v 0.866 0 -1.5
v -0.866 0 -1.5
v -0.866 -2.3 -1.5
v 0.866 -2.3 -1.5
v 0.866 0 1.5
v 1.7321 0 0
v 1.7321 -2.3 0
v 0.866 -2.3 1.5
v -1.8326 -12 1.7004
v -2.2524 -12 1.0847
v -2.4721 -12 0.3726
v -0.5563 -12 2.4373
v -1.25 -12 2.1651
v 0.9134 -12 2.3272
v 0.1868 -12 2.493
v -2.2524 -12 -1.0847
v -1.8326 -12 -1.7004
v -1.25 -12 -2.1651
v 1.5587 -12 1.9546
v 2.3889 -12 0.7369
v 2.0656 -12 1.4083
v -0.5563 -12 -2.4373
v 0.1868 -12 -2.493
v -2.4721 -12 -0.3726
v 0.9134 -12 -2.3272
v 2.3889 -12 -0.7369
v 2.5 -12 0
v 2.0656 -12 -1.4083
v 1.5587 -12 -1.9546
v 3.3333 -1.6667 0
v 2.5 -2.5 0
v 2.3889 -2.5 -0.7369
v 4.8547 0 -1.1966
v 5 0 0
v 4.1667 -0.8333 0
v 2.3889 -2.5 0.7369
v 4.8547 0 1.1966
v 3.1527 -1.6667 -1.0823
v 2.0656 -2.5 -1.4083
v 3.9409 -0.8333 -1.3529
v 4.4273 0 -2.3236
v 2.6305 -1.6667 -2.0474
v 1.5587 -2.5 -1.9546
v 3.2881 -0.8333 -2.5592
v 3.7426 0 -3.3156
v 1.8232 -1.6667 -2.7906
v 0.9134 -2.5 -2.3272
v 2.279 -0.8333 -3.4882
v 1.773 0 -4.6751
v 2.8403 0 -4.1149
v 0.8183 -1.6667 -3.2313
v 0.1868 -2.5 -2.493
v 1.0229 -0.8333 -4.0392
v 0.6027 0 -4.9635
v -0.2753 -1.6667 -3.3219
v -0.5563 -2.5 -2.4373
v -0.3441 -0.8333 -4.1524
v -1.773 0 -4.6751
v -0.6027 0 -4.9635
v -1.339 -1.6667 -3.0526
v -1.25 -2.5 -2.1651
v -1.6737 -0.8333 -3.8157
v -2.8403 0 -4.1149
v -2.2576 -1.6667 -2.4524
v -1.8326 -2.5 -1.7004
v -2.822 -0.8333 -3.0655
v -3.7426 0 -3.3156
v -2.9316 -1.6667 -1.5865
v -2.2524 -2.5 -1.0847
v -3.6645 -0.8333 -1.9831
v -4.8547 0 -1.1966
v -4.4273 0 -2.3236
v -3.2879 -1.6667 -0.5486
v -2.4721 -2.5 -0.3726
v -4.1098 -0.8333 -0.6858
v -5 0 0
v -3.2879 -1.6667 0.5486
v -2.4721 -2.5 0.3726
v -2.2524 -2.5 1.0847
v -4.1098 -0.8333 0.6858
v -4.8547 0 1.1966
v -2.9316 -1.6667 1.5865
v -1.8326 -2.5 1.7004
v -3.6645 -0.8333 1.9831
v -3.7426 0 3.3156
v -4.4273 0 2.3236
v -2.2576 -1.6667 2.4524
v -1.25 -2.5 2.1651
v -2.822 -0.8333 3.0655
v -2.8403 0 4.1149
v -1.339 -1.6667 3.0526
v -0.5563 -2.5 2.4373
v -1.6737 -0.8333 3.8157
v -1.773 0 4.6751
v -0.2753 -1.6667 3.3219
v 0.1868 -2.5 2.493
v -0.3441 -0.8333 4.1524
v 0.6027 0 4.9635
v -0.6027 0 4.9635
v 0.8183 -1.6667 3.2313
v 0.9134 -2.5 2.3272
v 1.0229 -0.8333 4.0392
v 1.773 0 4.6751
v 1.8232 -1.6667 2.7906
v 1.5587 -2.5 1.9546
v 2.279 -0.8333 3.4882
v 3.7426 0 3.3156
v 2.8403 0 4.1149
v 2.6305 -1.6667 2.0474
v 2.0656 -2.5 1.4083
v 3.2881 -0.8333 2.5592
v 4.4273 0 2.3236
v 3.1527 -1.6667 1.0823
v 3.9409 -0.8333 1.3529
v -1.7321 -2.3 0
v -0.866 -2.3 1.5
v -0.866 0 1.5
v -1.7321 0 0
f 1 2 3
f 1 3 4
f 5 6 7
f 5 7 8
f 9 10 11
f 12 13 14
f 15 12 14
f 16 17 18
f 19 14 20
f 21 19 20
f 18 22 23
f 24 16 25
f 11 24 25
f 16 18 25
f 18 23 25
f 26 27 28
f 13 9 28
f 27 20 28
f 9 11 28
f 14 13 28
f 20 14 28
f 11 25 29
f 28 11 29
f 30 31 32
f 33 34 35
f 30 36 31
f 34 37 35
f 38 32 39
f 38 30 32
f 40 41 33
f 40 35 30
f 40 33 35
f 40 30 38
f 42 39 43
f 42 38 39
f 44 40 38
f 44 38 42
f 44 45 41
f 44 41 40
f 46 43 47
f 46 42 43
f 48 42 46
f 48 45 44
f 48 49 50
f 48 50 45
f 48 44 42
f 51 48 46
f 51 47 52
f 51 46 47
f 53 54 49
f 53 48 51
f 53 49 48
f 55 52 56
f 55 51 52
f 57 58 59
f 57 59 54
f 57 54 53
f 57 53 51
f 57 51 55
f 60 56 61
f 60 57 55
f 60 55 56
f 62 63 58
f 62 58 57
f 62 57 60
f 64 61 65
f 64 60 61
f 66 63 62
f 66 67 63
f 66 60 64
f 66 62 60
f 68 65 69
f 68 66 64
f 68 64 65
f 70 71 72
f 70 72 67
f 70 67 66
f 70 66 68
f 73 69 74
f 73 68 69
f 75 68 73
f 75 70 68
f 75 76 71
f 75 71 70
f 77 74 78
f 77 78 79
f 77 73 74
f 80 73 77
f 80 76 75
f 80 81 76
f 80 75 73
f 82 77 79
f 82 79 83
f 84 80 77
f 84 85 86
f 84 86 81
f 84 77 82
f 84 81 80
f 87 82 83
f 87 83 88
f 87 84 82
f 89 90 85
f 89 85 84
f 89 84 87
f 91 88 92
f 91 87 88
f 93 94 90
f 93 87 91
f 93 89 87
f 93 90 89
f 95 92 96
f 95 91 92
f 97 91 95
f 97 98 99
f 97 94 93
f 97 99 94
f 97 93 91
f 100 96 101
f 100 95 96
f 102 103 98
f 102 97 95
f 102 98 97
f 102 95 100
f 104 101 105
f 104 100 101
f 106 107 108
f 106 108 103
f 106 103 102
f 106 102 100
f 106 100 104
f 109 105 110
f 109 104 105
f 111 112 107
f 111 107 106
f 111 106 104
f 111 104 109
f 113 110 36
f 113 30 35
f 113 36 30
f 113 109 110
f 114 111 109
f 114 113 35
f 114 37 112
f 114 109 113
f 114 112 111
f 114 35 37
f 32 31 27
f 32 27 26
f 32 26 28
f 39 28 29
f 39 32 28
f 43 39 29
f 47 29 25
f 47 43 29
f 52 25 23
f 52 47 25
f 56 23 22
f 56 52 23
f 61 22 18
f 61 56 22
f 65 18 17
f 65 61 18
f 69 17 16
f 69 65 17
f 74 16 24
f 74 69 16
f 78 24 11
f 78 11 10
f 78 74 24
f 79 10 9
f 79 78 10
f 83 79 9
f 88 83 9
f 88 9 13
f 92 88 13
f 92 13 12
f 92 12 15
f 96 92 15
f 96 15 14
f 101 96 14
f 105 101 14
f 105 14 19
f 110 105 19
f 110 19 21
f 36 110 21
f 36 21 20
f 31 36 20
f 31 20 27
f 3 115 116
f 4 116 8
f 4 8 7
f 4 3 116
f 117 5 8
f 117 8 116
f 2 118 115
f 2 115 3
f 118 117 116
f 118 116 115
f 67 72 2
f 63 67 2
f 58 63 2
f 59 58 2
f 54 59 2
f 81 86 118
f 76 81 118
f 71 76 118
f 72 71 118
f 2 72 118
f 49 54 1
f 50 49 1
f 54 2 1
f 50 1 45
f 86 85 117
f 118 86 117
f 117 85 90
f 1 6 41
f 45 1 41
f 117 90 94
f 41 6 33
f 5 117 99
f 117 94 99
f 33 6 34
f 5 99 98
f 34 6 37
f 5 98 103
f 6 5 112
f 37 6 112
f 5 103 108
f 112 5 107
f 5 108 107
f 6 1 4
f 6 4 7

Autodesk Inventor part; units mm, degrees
ref_plane "YZ Plane" through (0, 0, 0) normal (1, 0, 0) x (0, 1, 0)
ref_plane "XZ Plane" through (0, 0, 0) normal (0, 1, 0) x (-1, 0, 0)
ref_plane "XY Plane" through (0, 0, 0) normal (0, 0, 1) x (1, 0, 0)
sketch "Head Revolution Profile" plane through (0, 0, 0) normal (0, 0, 1) x (1, 0, 0)
  line L0 (0, -5) -> (5, 0)
  line L1 (5, 0) -> (0, 0)
  line L2 (0, 0) -> (0, -5)
  dimension "d0" = 0
  dimension "d1" = 45
  dimension "d2" = 5
  dimension "d3" = 0
revolve "Head" add sketch "Head Revolution Profile" angle 360 about axis through (0, 0, 0) along (0, -1, 0)
sketch "Body Cross Section" plane through (0, 0, 0) normal (0, 1, 0) x (1, 0, 0)
  circle A0 centre (0, 0) radius 2.5
  point P0 (0, 0)
  dimension "d5" = 5
extrude "Body" add sketch "Body Cross Section" against normal blind 12
thread "Thread" size "M5x0.8" class "6g" standard "ANSI Metric M Profile" full length
sketch "Key Socket Cutout Outline" plane through (0, 0, 0) normal (0, 1, 0) x (1, 0, 0)
  line L0 (0.866, 1.5) -> (1.7321, 0)
  line L1 (1.7321, 0) -> (0.866, -1.5)
  line L2 (0.866, -1.5) -> (-0.866, -1.5)
  line L3 (-0.866, -1.5) -> (-1.7321, 0)
  line L4 (-1.7321, 0) -> (-0.866, 1.5)
  line L5 (-0.866, 1.5) -> (0.866, 1.5)
  point P0 (0, 0)
  point P1 (0, 0)
  dimension "d10" = 3
extrude "Key Socket Cutout" cut sketch "Key Socket Cutout Outline" against normal blind 2.3
properties part number "SSK-M5-12-A4" material "Stainless Steel AISI 317"
